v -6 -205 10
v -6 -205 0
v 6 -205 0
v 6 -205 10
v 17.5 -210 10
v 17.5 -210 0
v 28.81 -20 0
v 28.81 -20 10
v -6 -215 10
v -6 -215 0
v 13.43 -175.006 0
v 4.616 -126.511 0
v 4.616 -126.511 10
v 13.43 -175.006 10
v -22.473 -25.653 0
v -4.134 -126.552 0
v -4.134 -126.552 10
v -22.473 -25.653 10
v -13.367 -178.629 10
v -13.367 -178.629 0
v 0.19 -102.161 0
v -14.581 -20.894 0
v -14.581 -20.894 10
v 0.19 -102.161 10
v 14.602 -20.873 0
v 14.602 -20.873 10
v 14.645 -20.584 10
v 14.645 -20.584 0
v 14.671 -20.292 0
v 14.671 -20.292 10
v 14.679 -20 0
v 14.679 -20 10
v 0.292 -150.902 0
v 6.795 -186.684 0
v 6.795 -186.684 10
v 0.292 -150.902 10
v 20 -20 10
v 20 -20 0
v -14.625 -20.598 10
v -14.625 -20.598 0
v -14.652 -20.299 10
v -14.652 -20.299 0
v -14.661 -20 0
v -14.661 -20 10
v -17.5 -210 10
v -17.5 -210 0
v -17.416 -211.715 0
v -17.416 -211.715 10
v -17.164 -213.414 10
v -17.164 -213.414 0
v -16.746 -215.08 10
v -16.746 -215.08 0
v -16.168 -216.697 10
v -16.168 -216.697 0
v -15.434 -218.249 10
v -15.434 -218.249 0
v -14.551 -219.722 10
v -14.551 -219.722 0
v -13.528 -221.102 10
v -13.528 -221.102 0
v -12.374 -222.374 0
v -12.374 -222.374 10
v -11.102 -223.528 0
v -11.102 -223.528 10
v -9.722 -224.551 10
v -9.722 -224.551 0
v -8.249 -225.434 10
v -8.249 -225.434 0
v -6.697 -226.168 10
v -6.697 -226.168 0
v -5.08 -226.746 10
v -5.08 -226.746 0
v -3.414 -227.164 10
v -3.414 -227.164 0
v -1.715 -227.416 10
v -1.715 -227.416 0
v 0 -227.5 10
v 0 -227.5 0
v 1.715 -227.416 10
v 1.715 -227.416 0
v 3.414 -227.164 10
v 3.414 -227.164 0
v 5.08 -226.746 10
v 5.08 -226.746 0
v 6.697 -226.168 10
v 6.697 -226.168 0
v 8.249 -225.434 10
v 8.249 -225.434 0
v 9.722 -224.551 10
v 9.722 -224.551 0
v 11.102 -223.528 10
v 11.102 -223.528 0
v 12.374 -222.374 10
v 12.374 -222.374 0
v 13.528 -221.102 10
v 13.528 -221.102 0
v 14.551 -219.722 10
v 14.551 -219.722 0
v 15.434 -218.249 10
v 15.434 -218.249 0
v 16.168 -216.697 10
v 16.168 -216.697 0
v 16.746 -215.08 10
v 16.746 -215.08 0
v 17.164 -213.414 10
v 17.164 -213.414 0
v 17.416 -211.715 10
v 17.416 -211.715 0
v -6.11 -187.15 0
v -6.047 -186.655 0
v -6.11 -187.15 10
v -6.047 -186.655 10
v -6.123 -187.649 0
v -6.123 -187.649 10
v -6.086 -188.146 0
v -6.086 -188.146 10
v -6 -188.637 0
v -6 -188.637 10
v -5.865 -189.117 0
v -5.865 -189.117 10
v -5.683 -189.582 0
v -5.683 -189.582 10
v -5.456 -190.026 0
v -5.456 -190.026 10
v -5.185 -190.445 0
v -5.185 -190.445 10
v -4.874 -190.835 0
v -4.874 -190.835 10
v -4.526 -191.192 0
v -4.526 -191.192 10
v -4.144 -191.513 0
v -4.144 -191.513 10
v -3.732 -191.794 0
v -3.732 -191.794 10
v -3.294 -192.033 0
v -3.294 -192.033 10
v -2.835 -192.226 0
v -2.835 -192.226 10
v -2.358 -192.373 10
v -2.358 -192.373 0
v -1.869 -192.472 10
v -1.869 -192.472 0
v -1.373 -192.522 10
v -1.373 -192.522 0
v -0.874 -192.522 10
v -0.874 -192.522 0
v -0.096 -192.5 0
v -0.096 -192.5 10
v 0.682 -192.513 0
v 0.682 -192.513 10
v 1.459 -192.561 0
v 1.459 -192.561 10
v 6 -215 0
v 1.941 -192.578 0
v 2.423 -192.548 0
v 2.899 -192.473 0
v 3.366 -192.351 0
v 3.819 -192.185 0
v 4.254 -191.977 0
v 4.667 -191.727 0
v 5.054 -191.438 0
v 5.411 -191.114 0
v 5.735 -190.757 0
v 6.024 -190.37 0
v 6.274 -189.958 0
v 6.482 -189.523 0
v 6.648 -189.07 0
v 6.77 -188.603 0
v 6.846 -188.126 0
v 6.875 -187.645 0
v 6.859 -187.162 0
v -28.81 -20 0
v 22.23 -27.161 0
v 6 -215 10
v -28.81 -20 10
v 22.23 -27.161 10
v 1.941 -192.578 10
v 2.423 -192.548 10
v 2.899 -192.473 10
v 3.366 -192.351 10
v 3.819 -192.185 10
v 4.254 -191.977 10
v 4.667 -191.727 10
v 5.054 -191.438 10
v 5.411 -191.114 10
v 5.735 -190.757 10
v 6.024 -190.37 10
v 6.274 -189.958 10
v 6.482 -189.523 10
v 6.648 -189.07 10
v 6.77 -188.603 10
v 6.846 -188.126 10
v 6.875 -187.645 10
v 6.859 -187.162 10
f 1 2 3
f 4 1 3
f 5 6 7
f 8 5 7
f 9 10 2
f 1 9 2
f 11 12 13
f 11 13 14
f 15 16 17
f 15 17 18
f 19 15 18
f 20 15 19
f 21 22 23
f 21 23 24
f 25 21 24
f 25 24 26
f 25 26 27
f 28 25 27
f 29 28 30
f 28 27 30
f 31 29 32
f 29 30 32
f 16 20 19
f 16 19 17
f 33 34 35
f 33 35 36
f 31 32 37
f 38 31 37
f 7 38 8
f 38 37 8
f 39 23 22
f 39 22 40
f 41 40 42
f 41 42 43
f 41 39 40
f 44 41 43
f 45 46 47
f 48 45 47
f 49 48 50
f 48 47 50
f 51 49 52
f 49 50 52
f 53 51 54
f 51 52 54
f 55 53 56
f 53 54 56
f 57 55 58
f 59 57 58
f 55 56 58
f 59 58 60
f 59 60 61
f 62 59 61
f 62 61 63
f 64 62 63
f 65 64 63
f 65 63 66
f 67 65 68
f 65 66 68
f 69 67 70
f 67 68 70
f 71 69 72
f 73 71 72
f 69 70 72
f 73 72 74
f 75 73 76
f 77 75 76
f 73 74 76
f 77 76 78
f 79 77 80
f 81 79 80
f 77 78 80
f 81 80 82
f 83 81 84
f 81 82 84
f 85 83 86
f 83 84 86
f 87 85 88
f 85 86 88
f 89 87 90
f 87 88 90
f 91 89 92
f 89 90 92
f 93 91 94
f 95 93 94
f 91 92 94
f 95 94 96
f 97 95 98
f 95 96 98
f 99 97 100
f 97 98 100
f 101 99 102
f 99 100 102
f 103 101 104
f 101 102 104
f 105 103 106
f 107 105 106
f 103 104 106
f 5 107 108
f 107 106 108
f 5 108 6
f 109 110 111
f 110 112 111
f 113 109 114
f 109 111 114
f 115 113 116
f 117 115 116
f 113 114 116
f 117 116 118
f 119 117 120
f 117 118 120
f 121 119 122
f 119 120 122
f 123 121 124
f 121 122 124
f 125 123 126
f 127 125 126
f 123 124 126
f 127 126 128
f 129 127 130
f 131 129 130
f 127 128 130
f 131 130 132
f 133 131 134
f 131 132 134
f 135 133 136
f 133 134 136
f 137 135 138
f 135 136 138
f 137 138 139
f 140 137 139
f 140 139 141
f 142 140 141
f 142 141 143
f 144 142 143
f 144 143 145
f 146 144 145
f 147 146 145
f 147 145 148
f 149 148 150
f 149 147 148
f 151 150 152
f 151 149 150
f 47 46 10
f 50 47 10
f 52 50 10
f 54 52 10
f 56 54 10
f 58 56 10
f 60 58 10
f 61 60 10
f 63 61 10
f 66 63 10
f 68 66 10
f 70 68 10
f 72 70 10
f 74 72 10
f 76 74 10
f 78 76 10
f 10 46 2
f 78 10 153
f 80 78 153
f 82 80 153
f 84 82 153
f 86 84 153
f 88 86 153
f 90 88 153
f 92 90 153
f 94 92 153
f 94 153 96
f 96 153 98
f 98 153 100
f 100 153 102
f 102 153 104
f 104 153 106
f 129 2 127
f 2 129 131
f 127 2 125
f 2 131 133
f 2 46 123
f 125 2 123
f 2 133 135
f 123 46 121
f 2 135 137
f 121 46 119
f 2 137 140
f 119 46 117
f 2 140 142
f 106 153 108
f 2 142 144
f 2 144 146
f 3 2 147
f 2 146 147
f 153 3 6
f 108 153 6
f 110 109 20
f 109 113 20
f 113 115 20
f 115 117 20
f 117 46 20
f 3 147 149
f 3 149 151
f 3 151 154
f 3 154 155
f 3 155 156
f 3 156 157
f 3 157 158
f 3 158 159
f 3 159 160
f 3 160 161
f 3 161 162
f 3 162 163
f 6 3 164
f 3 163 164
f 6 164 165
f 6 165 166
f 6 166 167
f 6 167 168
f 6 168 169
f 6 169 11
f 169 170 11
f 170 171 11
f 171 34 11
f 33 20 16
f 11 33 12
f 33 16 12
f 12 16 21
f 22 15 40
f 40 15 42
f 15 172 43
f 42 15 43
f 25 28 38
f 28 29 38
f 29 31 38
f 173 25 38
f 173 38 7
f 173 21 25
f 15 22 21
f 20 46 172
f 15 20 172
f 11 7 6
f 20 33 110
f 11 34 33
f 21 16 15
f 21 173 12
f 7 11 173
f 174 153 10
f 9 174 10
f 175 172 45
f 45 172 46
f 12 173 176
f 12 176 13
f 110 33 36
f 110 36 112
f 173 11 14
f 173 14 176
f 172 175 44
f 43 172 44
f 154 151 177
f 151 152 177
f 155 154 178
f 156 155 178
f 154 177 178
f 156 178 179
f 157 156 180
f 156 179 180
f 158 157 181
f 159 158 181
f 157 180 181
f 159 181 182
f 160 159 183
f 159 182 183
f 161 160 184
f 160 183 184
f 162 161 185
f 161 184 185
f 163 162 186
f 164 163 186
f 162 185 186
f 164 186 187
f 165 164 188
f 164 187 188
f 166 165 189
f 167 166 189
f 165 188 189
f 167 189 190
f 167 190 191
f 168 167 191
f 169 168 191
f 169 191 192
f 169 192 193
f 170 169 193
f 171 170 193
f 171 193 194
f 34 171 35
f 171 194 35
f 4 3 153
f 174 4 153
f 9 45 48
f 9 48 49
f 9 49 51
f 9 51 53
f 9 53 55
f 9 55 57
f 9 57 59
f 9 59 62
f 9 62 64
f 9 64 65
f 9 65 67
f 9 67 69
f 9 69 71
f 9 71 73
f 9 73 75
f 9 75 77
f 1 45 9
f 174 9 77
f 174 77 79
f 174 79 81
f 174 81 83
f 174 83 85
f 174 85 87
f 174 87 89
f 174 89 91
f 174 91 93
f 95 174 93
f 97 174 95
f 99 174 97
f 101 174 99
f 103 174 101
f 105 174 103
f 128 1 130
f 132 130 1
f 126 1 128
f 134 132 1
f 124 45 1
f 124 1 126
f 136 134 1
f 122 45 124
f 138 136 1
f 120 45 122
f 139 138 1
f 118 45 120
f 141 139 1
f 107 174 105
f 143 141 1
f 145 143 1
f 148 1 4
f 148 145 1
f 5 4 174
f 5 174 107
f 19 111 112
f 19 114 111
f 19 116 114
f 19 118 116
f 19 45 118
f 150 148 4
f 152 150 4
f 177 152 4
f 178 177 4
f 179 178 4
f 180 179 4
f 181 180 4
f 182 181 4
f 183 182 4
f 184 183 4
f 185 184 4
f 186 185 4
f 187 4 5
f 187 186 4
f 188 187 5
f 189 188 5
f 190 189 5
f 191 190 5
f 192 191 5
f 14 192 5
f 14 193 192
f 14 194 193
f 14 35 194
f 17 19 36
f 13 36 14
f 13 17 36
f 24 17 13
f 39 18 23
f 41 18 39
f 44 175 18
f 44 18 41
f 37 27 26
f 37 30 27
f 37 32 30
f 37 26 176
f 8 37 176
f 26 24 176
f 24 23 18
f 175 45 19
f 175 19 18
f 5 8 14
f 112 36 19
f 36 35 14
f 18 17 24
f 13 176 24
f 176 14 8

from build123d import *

# Parameters (mm, degrees)
SKETCH1_R           = 3
BOSS_EXTRUDE2_DEPTH = 10
FILLET1_R           = 20
FILLET2_R           = 20
CUT_EXTRUDE1_START  = -10
CUT_EXTRUDE1_DEPTH  = 10
FILLET3_R           = 5
CUT_EXTRUDE6_DEPTH  = 10
SKETCH7_W           = 65.010384479
SKETCH7_H           = 38.033760717
CUT_EXTRUDE7_DEPTH  = 10


with BuildPart() as part:
    # Sketch1 → Boss-Extrude2 (new body)
    with BuildSketch(Plane.XY):
        with BuildLine():
            Line((-30, 15.770412854), (-30, 0))
            Line((-30, 0), (-17.5, -210))
            ThreePointArc((-17.5, -210), (0, -227.5), (17.5, -210))
            Line((17.5, -210), (30, 0))
            Line((30, 0), (30, 15.770412854))
            Line((30, 15.770412854), (-30, 15.770412854))
        make_face()
        with Locations((-15, 0)):
            Circle(SKETCH1_R, mode=Mode.SUBTRACT)
        with Locations((15, 0)):
            Circle(SKETCH1_R, mode=Mode.SUBTRACT)
        Polygon((0, -205), (6, -205), (6, -215), (-6, -215), (-6, -205), align=None, mode=Mode.SUBTRACT)
    extrude(amount=BOSS_EXTRUDE2_DEPTH)

    # Fillet1
    fillet1_edges = [part.edges().sort_by_distance(p)[0] for p in [
        (-30, 15.770412854, 5),
    ]]
    fillet(fillet1_edges, radius=FILLET1_R)

    # Fillet2
    fillet2_edges = [part.edges().sort_by_distance(p)[0] for p in [
        (30, 15.770412854, 5),
    ]]
    fillet(fillet2_edges, radius=FILLET2_R)

    # Sketch4 → Cut-Extrude1 (cut)
    with BuildSketch(Plane.XY.offset(10).offset(CUT_EXTRUDE1_START)):
        Polygon((-15.651797422, -15), (0.190220551, -102.160979768), (15.643622882, -15), (15, -15), align=None)
        Polygon((-22.473027071, -25.6531452), (-13.367328465, -178.628881795), (-4.134156204, -126.551525408), align=None)
        Polygon((22.230419841, -27.161313899), (4.615986353, -126.511039477), (13.430162671, -175.005634359), align=None)
        with BuildLine():
            Line((0.291609598, -150.901585116), (-7.372445375, -194.128735111))
            ThreePointArc((-7.372445375, -194.128735111), (0.476576628, -192.506490497), (8.225632191, -194.553674383))
            Line((8.225632191, -194.553674383), (0.291609598, -150.901585116))
        make_face()
    extrude(amount=CUT_EXTRUDE1_DEPTH, mode=Mode.SUBTRACT)

    # Fillet3
    fillet3_edges = [part.edges().sort_by_distance(p)[0] for p in [
        (8.225632191, -194.553674383, 5),
        (-7.372445375, -194.128735111, 5),
        (-15.651797422, -15, 5),
        (15.643622882, -15, 5),
    ]]
    fillet(fillet3_edges, radius=FILLET3_R)

    # Sketch5 → Cut-Extrude6 (cut)
    with BuildSketch(Plane.XY.offset(10)):
        with BuildLine():
            Line((29.260488635, 0), (20, 0))
            Line((20, 0), (20, -20))
            Line((20, -20), (28.80952381, -20))
            Line((28.80952381, -20), (29.677502384, -5.417959945))
            ThreePointArc((29.677502384, -5.417959945), (29.653859351, -2.694751229), (29.260488635, 0))
        make_face()
        with BuildLine():
            Line((20, 12.921923742), (20, 0))
            Line((20, 0), (29.260488635, 0))
            ThreePointArc((29.260488635, 0), (25.96931496, 7.420606017), (20, 12.921923742))
        make_face()
    extrude(amount=-CUT_EXTRUDE6_DEPTH, mode=Mode.SUBTRACT)

    # Sketch7 → Cut-Extrude7 (cut)
    with BuildSketch(Plane.XY.offset(10)):
        with Locations((-3.695668429, -0.983119642)):
            Rectangle(SKETCH7_W, SKETCH7_H)
    extrude(amount=-CUT_EXTRUDE7_DEPTH, mode=Mode.SUBTRACT)


solid = part.part
